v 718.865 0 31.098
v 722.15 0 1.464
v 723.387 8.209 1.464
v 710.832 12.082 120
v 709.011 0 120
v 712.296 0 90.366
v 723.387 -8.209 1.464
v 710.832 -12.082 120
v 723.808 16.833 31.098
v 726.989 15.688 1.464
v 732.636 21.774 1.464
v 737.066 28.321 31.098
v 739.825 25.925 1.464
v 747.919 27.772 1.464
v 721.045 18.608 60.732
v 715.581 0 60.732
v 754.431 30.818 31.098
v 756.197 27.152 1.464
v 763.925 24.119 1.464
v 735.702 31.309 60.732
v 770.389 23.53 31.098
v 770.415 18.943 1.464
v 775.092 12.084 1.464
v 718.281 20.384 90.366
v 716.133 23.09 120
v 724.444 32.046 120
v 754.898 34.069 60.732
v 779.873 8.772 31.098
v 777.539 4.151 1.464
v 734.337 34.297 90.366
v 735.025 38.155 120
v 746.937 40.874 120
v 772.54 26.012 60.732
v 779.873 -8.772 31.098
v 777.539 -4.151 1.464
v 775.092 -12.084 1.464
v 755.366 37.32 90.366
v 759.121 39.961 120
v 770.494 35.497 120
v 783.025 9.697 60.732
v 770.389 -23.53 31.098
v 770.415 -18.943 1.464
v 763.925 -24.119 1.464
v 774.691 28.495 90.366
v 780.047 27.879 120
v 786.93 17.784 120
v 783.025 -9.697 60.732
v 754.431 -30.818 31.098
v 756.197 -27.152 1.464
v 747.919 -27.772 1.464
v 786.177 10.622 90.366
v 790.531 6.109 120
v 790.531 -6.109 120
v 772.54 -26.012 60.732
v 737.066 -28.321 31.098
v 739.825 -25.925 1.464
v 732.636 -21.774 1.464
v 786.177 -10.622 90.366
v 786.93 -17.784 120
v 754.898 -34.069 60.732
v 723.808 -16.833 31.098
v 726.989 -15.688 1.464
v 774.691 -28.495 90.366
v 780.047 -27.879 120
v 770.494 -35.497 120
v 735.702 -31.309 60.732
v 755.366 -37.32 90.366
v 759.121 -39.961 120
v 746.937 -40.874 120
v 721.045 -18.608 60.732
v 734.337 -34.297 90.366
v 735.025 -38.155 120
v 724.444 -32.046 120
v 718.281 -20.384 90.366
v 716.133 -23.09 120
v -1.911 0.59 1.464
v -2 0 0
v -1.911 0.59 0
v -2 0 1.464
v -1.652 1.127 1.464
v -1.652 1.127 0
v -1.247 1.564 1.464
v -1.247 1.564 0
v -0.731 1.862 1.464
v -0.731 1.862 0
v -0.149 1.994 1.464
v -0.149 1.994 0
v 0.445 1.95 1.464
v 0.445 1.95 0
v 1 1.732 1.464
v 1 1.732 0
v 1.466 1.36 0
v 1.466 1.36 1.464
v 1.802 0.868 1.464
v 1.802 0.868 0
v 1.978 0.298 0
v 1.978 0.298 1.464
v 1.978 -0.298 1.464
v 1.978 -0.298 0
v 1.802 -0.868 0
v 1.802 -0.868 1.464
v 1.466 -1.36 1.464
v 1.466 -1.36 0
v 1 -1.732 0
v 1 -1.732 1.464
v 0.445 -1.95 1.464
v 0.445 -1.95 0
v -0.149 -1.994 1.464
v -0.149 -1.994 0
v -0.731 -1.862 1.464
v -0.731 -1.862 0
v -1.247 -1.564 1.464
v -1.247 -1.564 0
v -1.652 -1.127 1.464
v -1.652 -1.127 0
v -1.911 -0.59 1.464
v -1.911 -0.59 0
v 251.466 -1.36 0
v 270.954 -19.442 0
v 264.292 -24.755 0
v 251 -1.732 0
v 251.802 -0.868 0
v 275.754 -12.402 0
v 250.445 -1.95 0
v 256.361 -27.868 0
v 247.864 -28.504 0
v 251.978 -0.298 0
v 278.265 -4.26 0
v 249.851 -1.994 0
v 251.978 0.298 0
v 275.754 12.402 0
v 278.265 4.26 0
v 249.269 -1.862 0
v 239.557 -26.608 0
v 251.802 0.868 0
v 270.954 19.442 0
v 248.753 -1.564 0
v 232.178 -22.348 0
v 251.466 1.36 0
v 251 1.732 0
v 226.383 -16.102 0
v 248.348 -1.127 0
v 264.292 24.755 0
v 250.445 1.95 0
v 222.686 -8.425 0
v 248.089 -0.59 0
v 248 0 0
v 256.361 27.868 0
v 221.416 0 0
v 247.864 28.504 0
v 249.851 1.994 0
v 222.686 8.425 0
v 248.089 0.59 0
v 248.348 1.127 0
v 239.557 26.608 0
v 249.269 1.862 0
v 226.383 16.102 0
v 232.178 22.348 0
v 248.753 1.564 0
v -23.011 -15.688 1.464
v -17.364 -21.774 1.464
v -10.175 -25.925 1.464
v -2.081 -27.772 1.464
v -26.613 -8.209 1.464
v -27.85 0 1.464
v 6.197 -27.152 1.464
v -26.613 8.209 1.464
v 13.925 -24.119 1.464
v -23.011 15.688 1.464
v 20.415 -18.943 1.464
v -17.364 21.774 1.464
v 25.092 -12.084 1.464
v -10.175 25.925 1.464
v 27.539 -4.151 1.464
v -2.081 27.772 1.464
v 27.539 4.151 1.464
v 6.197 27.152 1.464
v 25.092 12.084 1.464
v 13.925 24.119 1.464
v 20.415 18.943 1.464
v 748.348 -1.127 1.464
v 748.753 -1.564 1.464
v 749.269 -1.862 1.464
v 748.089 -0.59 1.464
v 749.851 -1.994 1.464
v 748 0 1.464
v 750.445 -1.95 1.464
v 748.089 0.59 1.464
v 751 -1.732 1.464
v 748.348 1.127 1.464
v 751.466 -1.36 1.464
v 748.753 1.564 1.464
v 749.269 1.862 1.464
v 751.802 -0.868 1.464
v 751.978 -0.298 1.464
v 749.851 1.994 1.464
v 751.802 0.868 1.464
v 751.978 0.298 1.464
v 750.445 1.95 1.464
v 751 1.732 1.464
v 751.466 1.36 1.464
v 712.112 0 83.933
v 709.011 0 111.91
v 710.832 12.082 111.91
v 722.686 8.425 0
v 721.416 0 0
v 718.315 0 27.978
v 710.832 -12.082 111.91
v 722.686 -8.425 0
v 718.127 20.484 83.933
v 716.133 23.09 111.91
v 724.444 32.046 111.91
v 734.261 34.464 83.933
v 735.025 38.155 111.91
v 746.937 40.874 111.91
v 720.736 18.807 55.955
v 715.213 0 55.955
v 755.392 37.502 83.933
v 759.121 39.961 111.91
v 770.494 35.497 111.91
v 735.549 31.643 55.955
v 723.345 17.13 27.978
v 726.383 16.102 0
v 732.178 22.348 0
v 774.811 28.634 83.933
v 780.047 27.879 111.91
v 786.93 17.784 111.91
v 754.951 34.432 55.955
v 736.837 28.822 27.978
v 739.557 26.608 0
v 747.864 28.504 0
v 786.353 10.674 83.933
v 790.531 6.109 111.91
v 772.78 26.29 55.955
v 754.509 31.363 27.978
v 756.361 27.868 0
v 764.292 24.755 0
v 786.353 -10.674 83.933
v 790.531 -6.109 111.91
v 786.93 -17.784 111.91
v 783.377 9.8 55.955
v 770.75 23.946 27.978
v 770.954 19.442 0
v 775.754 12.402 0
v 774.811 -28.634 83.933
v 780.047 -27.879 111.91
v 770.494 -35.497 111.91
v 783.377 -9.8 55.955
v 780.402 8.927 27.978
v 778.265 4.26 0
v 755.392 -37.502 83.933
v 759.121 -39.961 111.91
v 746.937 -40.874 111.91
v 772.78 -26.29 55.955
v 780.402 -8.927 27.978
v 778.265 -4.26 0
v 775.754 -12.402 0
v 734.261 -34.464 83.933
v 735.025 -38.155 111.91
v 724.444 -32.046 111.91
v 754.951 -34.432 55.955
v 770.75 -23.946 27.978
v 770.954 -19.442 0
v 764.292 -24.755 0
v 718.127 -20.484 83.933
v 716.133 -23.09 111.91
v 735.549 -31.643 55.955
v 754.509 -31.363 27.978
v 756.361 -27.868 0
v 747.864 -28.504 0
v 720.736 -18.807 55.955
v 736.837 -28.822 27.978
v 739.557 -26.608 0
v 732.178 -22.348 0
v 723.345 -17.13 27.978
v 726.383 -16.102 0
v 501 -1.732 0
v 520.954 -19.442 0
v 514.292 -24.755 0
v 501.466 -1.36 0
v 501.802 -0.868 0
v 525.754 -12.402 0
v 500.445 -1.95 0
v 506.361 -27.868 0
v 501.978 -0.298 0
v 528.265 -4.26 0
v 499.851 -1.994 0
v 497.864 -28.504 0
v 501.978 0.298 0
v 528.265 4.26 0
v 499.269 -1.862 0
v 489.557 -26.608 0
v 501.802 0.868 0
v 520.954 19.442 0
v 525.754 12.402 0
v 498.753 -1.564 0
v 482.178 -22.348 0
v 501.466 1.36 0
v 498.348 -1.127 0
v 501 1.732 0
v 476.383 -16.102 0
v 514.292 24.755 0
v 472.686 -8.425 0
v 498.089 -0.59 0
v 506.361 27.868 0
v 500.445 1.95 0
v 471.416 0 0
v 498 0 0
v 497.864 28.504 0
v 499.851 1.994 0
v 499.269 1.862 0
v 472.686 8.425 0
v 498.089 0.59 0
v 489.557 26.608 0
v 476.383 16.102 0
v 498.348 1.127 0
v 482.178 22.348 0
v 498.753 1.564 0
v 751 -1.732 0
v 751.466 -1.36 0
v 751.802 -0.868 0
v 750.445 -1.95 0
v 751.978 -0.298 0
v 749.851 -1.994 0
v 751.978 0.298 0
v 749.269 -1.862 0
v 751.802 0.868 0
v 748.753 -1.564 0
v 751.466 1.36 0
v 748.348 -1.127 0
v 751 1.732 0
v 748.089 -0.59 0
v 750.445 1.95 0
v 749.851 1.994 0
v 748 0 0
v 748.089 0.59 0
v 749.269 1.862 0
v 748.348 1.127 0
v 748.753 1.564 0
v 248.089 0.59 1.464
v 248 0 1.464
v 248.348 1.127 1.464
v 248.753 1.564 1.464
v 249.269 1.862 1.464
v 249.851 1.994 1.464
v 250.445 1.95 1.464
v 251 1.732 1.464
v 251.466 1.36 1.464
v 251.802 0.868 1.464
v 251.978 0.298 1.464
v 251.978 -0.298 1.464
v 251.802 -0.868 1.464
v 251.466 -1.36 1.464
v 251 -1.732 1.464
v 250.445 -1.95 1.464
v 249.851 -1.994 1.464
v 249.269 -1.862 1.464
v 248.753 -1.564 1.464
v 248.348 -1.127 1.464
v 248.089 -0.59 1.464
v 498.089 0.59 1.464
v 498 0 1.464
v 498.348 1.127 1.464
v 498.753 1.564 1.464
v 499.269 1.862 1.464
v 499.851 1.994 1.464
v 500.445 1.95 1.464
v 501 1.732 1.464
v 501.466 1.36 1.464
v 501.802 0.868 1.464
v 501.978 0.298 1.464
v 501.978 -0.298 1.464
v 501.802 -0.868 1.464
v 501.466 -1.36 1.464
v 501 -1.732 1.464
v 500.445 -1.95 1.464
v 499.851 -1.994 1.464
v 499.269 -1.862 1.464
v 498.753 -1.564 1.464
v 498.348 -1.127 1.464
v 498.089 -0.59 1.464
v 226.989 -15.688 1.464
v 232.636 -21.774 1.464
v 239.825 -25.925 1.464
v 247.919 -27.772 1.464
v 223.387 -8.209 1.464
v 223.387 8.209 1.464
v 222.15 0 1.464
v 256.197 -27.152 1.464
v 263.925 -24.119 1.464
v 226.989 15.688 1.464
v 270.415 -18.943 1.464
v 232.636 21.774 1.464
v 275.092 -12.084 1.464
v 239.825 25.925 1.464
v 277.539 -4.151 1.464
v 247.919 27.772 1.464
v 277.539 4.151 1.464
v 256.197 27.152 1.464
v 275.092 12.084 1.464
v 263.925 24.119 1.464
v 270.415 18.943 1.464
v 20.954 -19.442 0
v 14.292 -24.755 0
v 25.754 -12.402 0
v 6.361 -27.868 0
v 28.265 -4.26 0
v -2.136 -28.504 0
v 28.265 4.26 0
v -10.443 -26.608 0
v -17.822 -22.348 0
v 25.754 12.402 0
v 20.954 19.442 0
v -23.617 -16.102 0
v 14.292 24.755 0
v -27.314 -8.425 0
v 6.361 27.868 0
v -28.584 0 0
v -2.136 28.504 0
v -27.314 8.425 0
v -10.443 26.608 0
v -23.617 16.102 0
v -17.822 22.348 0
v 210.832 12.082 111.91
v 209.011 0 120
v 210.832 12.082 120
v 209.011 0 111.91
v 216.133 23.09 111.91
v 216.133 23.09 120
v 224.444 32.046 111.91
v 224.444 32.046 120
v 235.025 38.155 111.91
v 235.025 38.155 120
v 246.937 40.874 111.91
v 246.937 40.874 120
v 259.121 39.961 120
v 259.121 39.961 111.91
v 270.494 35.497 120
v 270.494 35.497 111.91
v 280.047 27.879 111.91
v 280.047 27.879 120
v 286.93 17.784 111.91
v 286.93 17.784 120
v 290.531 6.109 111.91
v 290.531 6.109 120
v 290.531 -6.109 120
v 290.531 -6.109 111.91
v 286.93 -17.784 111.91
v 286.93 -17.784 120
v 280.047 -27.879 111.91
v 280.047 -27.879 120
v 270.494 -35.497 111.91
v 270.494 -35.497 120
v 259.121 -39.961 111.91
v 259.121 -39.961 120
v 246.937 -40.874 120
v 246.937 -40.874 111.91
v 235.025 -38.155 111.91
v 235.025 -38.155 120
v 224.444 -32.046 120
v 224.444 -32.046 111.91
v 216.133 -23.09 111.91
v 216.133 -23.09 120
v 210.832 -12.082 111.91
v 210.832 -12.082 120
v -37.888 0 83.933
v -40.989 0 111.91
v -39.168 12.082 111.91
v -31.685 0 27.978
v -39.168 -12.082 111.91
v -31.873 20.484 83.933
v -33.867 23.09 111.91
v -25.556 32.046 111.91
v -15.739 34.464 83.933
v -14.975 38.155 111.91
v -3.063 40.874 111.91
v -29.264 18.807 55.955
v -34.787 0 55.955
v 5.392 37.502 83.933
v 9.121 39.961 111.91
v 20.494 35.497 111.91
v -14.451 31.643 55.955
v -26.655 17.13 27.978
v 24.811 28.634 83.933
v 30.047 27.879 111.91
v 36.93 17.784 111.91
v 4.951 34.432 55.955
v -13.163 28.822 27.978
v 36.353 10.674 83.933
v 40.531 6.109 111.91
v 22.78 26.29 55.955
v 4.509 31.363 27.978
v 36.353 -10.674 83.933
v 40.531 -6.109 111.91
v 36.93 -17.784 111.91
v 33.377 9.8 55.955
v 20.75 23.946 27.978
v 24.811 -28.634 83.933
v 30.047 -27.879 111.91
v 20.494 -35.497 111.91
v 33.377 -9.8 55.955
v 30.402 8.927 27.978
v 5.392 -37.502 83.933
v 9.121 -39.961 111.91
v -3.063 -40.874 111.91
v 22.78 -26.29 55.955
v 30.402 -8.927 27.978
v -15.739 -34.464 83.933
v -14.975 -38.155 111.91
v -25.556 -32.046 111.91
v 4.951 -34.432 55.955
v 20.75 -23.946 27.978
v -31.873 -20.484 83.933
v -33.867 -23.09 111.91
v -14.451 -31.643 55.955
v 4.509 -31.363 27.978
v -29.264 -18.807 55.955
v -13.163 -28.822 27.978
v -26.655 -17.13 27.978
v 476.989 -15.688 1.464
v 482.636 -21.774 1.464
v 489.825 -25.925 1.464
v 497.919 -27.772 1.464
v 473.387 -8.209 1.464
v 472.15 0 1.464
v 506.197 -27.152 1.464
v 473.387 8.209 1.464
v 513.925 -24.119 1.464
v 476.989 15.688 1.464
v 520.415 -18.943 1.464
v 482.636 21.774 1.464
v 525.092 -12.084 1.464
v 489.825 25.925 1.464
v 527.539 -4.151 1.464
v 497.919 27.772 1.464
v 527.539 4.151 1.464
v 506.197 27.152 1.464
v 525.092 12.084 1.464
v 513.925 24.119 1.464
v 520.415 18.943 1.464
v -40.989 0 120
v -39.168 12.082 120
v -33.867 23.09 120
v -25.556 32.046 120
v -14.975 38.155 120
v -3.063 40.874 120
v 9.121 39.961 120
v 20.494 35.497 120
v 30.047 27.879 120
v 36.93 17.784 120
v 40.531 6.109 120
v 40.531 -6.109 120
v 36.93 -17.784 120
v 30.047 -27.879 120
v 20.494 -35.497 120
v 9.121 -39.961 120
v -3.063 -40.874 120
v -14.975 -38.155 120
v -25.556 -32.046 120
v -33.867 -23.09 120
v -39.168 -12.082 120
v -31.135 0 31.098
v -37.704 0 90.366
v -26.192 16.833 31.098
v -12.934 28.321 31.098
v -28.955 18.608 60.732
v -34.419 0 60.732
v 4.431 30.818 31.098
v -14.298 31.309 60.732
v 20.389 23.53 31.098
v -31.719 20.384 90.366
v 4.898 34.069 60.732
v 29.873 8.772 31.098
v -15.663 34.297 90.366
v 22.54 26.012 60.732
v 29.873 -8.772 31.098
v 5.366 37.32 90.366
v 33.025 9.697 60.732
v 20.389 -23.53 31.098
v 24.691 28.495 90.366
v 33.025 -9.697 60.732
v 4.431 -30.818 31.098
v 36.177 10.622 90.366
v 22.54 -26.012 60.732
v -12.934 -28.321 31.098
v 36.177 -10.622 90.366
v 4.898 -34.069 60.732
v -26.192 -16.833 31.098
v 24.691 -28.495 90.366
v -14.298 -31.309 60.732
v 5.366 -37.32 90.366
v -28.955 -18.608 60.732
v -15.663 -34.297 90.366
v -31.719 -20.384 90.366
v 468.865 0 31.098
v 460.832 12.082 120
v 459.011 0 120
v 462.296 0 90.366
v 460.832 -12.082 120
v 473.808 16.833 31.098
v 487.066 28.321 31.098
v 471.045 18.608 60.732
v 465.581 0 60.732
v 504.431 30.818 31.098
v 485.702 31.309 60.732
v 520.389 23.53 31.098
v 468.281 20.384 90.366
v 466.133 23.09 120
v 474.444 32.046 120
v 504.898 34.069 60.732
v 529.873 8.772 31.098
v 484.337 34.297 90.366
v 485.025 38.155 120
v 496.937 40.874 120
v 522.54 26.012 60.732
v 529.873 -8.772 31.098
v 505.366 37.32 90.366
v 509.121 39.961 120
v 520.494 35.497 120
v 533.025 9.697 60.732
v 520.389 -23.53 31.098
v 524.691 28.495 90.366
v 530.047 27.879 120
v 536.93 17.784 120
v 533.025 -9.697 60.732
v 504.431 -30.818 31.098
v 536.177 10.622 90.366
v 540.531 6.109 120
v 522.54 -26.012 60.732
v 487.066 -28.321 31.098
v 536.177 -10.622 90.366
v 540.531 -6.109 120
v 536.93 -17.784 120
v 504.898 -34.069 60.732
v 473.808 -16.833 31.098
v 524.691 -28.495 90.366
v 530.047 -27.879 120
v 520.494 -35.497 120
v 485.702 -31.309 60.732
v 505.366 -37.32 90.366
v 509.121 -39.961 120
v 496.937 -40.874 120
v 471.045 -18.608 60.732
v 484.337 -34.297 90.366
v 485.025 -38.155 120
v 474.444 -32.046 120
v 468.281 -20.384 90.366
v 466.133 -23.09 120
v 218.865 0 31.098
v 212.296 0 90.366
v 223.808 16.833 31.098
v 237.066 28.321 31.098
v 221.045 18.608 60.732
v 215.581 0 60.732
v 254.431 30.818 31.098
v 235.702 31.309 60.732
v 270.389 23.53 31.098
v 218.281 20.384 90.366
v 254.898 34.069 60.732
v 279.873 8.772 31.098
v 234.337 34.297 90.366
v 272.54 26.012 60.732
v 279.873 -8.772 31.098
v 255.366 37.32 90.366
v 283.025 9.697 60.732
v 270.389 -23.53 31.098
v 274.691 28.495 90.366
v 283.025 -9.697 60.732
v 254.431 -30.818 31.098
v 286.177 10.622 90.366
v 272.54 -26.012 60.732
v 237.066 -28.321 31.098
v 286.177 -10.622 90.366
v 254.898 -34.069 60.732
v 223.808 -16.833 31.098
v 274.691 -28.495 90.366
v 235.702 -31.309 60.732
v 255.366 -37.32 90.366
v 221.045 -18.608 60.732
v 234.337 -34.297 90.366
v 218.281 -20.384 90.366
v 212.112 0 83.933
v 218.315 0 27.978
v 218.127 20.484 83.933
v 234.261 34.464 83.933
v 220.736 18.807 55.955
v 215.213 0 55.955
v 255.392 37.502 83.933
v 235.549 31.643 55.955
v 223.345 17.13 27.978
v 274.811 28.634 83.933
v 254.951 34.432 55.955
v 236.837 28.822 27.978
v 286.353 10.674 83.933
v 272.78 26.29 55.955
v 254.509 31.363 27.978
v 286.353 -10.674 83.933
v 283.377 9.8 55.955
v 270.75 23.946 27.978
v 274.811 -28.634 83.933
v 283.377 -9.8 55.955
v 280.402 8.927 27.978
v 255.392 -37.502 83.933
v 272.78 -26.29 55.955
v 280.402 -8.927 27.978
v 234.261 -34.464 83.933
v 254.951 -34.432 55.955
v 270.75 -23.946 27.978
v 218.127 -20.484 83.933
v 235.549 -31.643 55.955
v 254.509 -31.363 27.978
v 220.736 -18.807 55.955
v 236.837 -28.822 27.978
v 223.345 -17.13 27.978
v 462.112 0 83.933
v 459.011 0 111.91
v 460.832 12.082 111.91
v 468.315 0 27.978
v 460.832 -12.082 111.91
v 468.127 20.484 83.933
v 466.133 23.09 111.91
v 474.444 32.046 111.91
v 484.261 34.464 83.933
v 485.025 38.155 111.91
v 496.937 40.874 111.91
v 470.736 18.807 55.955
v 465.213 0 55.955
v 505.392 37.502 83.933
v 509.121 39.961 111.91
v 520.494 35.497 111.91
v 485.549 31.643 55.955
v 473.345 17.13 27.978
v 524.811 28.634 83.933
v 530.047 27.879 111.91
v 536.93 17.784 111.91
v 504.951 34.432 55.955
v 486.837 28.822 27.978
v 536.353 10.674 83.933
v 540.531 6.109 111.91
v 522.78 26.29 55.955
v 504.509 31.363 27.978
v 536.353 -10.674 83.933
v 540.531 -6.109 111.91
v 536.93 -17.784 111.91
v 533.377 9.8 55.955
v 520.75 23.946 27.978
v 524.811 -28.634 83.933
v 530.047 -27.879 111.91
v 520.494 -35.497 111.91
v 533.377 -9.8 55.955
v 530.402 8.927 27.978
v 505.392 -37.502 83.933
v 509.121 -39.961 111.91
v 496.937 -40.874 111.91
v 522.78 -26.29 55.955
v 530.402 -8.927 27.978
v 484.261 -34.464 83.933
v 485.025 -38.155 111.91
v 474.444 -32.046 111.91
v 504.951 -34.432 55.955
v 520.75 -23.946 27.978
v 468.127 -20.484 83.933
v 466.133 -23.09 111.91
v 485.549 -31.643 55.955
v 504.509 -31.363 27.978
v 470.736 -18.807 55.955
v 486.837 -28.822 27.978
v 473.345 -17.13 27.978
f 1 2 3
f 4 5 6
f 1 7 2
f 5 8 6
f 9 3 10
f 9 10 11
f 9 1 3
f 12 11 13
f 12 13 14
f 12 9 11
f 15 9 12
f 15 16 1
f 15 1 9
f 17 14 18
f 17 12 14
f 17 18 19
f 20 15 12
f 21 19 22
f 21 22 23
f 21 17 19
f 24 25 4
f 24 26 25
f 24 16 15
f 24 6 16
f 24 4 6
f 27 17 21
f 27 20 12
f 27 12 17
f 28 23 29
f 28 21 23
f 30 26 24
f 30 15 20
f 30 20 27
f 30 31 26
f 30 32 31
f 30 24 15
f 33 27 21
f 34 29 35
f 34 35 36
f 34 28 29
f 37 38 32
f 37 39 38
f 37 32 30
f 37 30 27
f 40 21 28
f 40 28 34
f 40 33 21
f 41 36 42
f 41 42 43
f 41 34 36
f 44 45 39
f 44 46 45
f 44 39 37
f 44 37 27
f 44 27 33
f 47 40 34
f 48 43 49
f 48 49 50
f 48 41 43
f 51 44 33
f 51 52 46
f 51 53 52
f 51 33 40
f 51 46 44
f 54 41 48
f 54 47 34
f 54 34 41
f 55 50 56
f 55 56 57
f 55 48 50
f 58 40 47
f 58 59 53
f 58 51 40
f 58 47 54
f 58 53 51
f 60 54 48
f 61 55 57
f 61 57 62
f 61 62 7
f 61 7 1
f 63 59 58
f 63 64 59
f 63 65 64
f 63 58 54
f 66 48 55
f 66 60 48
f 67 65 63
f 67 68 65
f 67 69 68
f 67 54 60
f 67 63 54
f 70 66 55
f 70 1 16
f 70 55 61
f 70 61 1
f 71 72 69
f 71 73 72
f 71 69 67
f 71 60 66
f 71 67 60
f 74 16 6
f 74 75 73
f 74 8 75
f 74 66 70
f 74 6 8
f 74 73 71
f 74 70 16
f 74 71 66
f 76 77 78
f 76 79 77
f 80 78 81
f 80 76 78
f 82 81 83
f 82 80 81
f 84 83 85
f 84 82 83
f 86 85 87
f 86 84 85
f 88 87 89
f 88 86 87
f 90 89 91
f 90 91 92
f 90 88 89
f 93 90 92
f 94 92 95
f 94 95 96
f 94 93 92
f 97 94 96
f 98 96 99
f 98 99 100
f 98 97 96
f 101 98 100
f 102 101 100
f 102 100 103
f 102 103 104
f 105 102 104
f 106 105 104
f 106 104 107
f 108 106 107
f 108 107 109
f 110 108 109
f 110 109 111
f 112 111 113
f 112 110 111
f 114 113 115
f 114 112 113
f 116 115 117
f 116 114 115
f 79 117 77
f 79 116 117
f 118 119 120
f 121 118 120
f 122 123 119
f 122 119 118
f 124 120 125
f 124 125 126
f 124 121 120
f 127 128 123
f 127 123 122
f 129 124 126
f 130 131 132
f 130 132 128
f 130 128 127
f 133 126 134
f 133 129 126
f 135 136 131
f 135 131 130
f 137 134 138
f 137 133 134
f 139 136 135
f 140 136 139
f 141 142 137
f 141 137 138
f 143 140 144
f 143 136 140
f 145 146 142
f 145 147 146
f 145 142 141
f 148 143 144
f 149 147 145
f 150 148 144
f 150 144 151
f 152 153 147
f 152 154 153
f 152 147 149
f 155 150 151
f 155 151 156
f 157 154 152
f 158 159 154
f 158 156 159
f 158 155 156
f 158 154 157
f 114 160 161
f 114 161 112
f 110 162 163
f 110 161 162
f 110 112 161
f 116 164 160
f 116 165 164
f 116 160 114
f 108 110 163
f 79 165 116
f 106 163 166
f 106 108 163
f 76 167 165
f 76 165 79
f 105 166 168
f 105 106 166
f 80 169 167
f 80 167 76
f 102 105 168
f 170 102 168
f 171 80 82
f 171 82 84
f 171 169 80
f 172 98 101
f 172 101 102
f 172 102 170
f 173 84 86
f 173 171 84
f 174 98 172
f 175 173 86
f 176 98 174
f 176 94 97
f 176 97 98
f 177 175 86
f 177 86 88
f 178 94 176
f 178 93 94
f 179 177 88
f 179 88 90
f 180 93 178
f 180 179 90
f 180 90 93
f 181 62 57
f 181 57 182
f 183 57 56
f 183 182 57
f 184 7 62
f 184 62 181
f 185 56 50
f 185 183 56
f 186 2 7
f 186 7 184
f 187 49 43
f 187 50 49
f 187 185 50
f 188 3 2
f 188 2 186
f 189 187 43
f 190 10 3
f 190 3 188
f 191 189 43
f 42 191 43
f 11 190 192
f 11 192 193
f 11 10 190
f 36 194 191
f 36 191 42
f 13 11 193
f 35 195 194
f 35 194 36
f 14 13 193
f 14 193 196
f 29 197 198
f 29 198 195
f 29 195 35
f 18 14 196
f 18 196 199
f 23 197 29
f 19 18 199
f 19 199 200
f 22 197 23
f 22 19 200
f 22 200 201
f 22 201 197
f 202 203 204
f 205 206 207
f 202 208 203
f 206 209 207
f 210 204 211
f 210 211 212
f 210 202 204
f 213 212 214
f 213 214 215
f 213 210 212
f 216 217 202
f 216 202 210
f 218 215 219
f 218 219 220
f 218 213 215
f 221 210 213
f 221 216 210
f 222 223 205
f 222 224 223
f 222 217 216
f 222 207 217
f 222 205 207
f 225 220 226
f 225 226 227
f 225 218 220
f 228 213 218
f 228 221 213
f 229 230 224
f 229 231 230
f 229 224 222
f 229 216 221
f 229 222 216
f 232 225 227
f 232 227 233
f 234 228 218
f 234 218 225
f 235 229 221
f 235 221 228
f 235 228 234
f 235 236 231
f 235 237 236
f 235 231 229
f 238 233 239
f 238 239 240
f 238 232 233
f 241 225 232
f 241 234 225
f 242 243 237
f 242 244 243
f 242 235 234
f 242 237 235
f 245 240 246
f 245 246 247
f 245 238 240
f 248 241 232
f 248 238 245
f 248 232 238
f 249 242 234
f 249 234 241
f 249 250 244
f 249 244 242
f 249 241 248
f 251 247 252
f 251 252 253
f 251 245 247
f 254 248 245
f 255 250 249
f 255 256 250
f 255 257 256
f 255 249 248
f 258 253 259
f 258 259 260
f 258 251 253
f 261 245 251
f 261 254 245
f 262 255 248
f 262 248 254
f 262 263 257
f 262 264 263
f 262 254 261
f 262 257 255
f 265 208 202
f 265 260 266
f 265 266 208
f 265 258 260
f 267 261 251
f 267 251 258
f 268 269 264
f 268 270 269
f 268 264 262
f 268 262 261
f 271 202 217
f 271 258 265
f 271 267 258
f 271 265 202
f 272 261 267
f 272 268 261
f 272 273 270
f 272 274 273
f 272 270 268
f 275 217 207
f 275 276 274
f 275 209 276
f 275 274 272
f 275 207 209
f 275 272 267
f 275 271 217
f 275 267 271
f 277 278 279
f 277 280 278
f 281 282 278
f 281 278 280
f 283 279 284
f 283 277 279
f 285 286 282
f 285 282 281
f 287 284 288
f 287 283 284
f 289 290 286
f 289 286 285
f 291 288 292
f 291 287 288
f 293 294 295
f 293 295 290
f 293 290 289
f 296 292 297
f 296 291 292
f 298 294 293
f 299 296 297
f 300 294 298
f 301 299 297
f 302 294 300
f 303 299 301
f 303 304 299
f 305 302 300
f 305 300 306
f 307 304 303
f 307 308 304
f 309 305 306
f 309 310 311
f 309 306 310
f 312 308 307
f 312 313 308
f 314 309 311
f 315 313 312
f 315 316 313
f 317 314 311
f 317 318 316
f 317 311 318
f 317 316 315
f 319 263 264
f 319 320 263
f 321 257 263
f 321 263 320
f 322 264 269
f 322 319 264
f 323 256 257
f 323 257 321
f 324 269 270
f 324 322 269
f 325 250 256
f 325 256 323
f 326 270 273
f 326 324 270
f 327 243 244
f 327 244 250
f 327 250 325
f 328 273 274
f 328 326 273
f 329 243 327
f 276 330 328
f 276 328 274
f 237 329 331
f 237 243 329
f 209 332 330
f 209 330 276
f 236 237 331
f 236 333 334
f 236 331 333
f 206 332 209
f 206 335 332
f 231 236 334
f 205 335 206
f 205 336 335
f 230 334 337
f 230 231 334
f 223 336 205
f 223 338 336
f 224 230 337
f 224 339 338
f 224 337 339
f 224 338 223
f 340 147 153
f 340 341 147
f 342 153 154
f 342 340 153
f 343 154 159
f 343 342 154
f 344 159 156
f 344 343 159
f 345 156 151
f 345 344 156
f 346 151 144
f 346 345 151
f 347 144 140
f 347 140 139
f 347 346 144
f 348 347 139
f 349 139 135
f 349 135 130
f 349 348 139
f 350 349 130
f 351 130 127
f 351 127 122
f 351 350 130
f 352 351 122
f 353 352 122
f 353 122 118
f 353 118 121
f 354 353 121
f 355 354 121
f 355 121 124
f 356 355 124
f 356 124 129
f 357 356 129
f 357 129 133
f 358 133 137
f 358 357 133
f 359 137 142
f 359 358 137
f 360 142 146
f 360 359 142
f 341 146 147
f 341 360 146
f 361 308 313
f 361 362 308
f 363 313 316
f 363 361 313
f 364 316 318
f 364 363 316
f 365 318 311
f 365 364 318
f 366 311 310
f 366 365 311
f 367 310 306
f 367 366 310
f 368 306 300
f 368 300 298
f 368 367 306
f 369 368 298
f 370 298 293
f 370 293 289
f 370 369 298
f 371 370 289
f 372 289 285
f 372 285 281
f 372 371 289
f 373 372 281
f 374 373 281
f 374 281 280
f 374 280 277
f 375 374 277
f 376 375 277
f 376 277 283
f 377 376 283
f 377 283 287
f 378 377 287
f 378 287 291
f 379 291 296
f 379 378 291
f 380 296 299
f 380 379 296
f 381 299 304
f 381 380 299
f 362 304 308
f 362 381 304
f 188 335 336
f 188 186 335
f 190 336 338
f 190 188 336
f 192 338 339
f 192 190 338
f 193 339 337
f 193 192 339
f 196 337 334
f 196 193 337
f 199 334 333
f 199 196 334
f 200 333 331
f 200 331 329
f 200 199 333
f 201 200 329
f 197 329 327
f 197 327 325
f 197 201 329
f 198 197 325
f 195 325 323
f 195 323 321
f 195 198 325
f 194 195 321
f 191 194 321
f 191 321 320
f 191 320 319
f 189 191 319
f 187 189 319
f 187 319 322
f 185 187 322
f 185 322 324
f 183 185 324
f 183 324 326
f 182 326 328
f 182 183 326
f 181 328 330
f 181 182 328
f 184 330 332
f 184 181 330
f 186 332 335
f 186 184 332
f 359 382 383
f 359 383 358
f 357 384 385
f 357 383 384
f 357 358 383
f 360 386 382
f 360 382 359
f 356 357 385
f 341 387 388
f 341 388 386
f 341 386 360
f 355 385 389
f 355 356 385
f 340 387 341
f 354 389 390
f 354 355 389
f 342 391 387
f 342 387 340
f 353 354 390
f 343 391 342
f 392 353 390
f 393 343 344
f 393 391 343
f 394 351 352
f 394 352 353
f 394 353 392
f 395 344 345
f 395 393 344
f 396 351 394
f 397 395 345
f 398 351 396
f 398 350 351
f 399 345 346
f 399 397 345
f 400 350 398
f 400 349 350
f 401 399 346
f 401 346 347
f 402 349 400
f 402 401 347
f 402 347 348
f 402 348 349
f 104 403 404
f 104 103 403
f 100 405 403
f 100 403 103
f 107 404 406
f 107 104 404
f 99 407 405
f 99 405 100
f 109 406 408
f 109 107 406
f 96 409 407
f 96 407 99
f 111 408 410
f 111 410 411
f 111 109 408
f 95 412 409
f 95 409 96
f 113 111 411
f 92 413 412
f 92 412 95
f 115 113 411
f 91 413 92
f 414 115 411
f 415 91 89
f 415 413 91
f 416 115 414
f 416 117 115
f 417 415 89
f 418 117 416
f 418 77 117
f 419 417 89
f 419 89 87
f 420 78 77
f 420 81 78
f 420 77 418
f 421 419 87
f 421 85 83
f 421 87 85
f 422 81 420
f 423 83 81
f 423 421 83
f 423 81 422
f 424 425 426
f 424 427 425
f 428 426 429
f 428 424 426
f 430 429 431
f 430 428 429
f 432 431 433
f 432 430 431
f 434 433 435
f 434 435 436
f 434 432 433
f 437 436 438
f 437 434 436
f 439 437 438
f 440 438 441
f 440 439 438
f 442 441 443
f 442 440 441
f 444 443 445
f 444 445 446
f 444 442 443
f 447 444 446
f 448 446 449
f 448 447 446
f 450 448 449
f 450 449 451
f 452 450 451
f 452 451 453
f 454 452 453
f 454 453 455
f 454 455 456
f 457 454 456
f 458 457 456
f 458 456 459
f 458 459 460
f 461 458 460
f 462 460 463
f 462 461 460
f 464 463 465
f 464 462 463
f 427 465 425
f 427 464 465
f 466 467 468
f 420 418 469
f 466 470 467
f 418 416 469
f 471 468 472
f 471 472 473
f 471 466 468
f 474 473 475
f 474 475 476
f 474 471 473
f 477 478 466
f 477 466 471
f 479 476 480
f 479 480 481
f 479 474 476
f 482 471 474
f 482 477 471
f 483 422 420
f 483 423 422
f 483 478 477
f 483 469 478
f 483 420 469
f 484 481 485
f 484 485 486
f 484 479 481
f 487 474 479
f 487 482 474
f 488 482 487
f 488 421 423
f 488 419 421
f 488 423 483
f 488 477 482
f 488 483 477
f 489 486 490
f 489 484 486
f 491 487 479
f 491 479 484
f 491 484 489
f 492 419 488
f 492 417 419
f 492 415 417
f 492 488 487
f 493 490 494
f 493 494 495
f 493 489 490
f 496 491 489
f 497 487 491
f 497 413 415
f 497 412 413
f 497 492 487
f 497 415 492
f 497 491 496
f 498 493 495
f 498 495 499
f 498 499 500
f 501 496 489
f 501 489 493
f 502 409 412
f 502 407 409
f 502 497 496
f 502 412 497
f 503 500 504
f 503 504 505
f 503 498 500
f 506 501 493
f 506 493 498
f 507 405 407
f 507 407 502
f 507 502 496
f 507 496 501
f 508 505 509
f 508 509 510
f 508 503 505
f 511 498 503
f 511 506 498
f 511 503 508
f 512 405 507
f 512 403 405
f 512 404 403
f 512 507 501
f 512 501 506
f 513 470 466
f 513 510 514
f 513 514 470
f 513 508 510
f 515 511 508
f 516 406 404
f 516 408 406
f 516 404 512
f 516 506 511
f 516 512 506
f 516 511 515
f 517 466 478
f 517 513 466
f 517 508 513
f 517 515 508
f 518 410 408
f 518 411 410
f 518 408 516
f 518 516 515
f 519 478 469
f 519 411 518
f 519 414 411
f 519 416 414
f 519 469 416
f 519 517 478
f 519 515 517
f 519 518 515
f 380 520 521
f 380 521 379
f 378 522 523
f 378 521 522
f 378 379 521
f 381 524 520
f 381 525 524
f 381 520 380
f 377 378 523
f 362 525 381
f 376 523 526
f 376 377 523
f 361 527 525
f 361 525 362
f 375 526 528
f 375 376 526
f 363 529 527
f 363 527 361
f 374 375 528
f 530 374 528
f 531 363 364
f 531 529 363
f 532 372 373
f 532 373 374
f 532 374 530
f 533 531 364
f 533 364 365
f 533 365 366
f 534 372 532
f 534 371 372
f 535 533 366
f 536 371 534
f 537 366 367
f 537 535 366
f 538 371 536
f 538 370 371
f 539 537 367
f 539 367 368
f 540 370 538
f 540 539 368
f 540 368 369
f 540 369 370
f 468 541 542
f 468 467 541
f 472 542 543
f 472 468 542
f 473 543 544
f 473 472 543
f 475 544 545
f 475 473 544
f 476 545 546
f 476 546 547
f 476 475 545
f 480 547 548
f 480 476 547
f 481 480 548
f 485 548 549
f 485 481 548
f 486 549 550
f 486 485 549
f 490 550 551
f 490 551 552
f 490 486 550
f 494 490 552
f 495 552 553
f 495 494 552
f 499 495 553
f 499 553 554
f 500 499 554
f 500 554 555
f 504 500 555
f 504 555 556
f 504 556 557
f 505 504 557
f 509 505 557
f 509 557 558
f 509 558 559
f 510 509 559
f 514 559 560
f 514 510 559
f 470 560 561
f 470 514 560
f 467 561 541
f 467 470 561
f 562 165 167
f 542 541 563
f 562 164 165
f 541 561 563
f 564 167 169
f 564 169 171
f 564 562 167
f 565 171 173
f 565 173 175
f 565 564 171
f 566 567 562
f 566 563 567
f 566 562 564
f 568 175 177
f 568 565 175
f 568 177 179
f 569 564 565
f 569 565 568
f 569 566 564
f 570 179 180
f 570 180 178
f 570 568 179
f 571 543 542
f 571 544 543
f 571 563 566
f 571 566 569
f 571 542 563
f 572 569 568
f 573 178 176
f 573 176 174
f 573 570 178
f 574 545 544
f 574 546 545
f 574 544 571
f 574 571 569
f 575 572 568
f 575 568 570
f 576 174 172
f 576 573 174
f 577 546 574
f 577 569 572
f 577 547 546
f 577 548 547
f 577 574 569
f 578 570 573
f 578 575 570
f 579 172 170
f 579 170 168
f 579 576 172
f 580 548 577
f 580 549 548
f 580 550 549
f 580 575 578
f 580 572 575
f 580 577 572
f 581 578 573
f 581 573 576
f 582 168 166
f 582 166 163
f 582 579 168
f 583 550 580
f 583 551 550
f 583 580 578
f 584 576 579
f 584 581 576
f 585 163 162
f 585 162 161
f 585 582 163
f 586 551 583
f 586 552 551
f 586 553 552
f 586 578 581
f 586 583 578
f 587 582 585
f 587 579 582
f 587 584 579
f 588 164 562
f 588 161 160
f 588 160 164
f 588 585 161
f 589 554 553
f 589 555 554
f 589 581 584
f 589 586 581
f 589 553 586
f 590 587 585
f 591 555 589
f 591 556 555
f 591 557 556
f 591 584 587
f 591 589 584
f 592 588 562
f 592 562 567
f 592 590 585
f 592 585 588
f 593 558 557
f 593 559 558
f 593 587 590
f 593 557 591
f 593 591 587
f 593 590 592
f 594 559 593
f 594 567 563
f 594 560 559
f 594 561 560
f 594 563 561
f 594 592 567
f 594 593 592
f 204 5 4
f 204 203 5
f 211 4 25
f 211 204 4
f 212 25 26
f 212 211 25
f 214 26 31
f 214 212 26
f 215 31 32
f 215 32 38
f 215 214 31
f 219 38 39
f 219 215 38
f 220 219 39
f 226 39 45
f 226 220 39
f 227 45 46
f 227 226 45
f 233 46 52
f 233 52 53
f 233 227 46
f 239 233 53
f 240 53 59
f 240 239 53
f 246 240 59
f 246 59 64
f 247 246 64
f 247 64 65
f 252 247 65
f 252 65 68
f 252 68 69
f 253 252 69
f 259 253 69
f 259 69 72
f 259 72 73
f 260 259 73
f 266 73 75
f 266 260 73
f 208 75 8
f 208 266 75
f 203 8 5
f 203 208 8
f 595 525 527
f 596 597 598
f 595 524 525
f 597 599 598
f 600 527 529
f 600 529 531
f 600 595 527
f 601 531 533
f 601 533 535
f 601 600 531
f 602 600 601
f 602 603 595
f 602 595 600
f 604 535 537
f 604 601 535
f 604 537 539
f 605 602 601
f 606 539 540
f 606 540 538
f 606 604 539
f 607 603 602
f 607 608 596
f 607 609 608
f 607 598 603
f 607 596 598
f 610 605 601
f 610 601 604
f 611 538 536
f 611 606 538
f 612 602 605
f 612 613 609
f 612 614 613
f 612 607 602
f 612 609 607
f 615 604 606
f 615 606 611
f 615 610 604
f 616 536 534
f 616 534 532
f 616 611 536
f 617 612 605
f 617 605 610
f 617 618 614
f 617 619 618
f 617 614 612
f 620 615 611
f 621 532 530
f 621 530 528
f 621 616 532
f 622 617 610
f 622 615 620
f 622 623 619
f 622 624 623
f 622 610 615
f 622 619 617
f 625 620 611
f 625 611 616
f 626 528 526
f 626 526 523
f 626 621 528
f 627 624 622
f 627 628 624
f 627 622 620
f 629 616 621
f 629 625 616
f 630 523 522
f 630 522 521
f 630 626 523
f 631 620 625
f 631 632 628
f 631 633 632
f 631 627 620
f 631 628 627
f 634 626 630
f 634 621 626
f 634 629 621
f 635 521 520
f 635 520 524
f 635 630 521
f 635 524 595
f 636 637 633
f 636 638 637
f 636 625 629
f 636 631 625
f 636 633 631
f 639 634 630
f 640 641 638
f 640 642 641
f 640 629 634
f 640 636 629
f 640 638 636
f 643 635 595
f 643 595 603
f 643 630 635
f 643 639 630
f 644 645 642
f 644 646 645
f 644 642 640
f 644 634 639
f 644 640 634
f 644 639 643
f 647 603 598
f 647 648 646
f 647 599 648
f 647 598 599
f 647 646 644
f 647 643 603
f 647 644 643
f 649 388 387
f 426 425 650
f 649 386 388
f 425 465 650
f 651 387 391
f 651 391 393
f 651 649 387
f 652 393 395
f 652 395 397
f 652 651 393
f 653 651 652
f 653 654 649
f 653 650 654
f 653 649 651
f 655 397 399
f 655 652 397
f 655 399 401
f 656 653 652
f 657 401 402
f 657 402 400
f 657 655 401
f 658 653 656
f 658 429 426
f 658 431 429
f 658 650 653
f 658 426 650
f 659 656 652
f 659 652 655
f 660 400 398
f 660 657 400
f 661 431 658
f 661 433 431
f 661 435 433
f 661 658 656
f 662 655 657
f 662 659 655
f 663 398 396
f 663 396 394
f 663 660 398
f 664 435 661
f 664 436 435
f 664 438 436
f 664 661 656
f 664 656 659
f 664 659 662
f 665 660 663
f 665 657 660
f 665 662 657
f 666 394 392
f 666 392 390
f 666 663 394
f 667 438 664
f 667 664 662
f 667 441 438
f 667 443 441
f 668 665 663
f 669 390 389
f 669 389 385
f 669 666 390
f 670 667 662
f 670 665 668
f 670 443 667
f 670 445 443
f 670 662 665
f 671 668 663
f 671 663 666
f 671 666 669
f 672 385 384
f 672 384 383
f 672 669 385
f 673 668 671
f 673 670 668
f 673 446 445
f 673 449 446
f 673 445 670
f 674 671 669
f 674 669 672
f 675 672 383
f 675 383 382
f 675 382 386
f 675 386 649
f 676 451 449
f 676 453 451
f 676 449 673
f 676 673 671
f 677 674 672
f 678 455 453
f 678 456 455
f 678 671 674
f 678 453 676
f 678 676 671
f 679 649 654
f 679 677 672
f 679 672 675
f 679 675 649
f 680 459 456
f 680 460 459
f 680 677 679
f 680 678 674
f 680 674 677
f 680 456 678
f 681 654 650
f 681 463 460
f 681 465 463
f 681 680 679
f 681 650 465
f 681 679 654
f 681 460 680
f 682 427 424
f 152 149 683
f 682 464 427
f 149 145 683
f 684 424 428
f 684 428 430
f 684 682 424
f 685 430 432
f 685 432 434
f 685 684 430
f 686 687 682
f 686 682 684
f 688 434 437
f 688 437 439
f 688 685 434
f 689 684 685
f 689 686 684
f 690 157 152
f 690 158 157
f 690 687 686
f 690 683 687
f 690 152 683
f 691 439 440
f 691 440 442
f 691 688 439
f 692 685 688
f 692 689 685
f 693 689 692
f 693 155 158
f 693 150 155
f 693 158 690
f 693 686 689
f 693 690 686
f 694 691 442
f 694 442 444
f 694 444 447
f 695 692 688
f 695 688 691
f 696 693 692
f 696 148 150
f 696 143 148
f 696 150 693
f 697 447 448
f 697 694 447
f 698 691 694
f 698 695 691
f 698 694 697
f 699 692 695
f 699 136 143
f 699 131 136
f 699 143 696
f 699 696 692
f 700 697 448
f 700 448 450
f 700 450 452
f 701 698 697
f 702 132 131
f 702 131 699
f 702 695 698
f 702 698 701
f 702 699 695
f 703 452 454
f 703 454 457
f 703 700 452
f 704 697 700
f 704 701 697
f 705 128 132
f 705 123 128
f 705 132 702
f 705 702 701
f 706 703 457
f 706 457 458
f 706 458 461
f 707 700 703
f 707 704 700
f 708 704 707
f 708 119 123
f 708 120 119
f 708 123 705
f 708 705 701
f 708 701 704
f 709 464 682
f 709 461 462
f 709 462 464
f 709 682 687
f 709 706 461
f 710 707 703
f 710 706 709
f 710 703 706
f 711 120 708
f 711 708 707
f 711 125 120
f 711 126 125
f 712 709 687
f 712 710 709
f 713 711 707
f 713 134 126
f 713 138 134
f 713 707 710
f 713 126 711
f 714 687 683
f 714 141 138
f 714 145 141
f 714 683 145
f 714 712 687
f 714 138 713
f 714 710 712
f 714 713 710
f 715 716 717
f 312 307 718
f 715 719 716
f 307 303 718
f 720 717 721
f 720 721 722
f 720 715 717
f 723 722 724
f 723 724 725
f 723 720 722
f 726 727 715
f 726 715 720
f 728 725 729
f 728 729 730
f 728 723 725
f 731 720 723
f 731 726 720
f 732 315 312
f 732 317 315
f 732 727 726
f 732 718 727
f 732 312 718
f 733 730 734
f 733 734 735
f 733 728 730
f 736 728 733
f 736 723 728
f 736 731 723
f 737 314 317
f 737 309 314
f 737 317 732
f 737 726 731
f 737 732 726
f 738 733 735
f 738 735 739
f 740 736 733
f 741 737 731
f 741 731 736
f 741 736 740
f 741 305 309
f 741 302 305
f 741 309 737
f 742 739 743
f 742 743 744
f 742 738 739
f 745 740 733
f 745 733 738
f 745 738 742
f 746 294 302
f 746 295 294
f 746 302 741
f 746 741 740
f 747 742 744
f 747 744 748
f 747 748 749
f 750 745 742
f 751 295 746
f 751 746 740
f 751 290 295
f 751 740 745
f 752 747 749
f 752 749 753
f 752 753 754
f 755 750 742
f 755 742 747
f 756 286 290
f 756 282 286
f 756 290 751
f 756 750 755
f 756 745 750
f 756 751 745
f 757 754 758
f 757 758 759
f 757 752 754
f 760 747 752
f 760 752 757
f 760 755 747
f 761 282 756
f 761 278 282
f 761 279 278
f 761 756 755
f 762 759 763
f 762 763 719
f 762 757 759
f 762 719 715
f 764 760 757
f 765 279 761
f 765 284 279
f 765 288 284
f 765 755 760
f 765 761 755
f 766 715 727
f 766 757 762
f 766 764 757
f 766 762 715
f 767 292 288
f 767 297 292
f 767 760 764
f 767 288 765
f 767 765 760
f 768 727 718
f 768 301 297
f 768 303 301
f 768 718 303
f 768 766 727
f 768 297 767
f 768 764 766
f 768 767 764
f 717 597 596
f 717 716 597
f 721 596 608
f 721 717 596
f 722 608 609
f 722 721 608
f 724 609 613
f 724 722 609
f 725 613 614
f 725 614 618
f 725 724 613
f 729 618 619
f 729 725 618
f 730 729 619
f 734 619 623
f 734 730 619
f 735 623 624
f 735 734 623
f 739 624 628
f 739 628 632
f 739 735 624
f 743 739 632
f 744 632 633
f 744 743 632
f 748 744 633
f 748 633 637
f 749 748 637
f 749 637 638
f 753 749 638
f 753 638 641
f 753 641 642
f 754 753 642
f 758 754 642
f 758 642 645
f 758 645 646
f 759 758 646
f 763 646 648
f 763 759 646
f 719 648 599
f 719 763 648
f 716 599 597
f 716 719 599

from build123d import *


with BuildPart() as f1:
    # F0 (on Front) → F1 (revolve)
    with BuildSketch(Plane.XZ):
        Polygon((-28.58427, 0), (-2, 0), (-2, 1.463653), (-27.849796, 1.463653), (-40.988765, 120), (-40.988765, 111.910107), align=None)
    revolve(axis=Axis((0, 0, 0.731827), (0, 0, -1)))


with BuildPart() as f4:
    # F2 (on Front) → F4 (revolve)
    with BuildSketch(Plane.XZ):
        Polygon((221.41573, 0), (248, 0), (248, 1.463653), (222.150204, 1.463653), (209.011235, 120), (209.011235, 111.910107), align=None)
    revolve(axis=Axis((250, 0, 0.731827), (0, 0, -1)))


with BuildPart() as f5:
    # F3 (on Front) → F5 (revolve)
    with BuildSketch(Plane.XZ):
        Polygon((471.41573, 0), (498, 0), (498, 1.463653), (472.150204, 1.463653), (459.011235, 120), (459.011235, 111.910107), align=None)
    revolve(axis=Axis((500, 0, 0.731827), (0, 0, -1)))


with BuildPart() as f7:
    # F6 (on Front) → F7 (revolve)
    with BuildSketch(Plane.XZ):
        Polygon((721.41573, 0), (748, 0), (748, 1.463653), (722.150204, 1.463653), (709.011235, 120), (709.011235, 111.910107), align=None)
    revolve(axis=Axis((750, 0, 0.731827), (0, 0, -1)))


solid = Compound([f1.part, f4.part, f5.part, f7.part])
